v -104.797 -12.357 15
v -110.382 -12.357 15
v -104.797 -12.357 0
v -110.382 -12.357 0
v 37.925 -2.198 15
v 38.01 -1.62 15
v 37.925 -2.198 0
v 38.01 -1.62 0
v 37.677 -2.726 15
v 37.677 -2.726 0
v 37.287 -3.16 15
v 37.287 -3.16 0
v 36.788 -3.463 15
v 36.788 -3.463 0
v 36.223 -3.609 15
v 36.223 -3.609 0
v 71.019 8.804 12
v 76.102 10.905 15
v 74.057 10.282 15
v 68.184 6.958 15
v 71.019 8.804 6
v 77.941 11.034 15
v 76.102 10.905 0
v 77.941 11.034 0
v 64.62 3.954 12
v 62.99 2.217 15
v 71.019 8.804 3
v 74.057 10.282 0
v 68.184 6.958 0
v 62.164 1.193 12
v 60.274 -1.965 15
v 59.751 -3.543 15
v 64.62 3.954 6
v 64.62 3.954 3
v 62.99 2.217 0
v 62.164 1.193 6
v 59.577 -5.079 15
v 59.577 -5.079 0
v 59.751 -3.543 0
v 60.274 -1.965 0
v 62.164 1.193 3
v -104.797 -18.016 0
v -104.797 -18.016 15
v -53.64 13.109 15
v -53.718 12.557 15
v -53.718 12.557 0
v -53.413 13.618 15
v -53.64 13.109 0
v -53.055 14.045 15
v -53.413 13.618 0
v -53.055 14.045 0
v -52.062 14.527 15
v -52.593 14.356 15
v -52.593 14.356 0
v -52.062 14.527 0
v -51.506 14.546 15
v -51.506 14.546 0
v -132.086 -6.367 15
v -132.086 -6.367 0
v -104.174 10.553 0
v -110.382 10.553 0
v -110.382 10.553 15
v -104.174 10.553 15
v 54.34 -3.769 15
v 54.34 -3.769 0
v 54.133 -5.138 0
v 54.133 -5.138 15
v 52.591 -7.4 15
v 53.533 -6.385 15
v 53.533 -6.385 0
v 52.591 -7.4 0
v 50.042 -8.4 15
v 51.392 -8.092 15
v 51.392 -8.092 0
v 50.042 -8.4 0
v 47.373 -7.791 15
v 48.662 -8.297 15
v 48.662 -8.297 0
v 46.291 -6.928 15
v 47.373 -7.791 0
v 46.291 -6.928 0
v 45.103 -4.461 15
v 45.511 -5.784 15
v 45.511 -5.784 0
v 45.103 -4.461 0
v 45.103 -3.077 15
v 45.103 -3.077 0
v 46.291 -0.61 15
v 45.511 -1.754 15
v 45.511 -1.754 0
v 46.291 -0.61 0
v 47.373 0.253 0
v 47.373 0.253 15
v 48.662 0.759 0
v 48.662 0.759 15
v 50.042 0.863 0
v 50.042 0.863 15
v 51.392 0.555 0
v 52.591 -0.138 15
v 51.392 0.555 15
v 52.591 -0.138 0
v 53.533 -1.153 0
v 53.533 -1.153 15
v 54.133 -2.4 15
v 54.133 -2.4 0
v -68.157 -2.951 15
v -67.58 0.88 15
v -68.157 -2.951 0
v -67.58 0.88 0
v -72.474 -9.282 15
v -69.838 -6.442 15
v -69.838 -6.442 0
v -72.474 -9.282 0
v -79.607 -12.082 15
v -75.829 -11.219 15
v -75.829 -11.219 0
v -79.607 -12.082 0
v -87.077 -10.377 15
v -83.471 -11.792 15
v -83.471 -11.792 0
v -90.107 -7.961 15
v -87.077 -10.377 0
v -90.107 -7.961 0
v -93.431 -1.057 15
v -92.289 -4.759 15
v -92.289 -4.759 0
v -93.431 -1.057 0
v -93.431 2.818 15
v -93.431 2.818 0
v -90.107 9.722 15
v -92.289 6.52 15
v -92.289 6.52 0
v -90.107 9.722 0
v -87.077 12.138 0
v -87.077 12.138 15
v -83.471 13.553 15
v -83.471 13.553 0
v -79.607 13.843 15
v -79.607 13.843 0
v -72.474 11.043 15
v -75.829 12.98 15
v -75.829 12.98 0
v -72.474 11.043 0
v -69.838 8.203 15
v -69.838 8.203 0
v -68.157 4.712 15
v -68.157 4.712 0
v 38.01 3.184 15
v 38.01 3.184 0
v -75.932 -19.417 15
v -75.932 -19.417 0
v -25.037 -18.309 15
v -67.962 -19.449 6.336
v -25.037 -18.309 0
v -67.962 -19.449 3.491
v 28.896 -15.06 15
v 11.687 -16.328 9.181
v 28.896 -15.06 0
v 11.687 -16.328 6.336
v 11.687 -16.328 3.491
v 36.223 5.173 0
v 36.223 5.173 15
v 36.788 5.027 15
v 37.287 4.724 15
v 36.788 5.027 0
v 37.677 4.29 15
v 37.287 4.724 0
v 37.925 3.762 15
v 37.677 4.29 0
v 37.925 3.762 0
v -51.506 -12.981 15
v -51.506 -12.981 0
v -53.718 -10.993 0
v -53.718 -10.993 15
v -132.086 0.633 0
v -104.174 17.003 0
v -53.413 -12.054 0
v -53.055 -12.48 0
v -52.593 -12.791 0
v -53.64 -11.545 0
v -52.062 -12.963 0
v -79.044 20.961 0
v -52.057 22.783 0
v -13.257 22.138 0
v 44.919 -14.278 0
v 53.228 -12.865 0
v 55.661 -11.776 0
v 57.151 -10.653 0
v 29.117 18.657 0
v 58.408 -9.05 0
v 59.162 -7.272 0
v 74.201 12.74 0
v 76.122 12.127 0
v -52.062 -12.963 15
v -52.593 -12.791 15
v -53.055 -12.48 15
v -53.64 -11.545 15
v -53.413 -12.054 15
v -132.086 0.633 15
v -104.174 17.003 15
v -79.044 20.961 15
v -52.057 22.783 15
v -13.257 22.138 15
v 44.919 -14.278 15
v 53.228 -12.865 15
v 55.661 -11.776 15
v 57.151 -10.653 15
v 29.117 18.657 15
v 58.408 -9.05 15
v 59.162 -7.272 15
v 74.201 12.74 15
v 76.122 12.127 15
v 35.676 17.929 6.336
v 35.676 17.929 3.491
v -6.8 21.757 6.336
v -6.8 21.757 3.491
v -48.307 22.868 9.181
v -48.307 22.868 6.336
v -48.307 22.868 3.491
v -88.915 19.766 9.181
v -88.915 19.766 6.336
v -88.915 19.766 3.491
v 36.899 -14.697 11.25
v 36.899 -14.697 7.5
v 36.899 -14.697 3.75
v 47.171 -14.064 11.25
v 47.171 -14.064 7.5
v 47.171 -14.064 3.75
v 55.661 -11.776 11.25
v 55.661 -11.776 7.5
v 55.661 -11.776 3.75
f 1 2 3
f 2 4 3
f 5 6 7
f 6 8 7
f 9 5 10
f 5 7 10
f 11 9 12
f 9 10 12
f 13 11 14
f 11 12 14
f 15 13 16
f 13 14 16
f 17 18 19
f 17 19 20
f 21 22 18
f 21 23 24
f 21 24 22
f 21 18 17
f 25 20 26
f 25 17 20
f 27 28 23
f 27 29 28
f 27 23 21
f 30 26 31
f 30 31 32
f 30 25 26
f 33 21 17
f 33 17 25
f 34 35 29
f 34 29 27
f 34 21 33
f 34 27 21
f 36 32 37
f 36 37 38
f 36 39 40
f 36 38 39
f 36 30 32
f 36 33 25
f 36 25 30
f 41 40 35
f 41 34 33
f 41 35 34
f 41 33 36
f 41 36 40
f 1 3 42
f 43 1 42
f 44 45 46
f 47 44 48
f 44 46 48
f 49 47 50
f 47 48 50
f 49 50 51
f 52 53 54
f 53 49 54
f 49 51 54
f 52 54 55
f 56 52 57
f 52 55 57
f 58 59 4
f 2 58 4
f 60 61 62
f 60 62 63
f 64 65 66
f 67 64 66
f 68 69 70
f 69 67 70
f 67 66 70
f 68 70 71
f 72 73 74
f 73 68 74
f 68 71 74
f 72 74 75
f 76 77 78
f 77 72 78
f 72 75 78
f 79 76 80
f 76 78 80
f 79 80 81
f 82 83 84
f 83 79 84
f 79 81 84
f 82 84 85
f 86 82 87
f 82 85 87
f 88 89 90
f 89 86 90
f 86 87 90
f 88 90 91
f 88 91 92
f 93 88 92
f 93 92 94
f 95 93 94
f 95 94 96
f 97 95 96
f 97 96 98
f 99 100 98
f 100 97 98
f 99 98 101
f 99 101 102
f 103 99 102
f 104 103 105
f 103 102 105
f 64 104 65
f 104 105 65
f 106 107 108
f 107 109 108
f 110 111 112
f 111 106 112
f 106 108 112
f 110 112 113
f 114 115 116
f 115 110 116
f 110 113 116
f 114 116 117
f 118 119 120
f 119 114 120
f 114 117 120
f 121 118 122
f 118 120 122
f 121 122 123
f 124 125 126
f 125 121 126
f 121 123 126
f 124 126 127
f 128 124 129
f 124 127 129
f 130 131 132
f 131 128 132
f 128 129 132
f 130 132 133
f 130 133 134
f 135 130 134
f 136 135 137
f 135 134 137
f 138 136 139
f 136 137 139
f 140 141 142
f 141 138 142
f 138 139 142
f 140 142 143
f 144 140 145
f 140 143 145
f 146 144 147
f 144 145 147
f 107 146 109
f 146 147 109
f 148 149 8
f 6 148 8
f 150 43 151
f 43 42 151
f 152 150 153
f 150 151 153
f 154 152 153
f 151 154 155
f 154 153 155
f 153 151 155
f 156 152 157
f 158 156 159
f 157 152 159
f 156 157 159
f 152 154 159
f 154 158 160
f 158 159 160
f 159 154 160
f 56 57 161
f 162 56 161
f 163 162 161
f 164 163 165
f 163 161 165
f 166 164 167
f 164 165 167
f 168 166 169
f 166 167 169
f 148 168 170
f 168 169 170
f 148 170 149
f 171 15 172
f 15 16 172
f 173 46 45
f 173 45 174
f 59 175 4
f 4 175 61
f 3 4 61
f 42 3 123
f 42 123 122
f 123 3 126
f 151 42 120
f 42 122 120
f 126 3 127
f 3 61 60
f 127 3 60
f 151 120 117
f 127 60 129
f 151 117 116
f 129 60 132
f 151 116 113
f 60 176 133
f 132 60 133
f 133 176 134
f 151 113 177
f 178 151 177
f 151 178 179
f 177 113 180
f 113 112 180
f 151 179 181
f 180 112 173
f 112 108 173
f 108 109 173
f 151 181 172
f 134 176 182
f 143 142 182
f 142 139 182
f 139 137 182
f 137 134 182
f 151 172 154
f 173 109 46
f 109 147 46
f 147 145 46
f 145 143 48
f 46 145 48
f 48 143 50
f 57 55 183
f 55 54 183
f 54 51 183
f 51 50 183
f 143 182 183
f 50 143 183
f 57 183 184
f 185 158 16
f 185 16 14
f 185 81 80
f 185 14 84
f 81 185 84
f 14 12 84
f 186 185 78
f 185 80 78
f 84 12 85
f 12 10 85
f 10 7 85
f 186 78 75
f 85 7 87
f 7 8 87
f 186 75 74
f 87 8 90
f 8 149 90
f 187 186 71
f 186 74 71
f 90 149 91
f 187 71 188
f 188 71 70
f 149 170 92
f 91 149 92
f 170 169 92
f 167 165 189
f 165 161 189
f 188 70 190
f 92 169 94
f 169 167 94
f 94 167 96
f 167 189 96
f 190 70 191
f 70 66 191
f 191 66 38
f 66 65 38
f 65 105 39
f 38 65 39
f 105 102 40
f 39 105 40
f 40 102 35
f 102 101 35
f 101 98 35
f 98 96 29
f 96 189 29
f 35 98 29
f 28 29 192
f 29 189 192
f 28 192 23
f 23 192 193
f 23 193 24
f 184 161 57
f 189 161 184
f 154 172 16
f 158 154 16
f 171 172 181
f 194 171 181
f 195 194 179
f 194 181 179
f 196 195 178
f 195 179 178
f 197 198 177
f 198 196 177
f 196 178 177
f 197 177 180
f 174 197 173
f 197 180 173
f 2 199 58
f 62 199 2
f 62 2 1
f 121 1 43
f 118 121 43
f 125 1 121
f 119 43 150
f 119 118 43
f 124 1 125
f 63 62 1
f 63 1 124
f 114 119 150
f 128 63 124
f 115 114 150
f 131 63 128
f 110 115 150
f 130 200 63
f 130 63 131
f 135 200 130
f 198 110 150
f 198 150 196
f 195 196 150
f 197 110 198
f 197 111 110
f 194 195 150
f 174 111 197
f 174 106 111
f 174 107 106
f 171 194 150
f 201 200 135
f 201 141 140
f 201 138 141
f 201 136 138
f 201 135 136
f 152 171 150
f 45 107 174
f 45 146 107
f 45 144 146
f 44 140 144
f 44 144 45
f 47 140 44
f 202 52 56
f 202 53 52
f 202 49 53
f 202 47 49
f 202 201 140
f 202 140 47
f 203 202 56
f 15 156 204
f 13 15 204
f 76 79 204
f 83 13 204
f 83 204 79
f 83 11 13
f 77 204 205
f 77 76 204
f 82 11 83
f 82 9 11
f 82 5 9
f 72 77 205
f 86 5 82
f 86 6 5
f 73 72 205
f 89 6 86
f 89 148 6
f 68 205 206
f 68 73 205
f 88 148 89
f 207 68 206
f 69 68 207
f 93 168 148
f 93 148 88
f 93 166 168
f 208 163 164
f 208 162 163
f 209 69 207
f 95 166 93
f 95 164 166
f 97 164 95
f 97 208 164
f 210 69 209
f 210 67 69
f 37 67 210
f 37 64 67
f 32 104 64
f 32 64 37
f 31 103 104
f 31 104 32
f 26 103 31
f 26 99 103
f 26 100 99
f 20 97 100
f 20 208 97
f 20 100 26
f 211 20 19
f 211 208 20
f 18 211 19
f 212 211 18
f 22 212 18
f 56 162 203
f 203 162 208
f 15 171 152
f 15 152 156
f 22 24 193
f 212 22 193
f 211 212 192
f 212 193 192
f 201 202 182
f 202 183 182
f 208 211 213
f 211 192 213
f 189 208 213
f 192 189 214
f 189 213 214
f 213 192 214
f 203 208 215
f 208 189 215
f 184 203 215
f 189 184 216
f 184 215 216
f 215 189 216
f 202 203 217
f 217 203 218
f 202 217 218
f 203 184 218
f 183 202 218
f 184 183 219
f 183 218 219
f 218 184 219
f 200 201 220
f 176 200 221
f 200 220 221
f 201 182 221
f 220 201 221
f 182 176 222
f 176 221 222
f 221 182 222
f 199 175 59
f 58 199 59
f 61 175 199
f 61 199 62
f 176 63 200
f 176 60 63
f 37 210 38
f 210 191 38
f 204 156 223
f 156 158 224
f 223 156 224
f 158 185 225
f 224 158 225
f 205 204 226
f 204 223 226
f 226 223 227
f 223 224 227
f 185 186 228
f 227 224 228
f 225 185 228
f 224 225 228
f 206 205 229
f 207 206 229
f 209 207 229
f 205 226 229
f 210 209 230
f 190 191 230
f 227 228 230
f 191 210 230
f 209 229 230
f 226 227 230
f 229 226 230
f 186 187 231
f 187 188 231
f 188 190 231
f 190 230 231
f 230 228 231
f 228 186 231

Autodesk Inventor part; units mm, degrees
ref_plane "YZ Plane" through (0, 0, 0) normal (1, 0, 0) x (0, 1, 0)
ref_plane "XZ Plane" through (0, 0, 0) normal (0, 1, 0) x (-1, 0, 0)
ref_plane "XY Plane" through (0, 0, 0) normal (0, 0, 1) x (1, 0, 0)
sketch "Sketch3" plane through (0, 0, 0) normal (0, 0, 1) x (1, 0, 0)
  line L0 (-80.5781, 0.8805) -> (-80.5781, 20.7988) construction
  circle A0 centre (-80.5781, 0.8805) radius 12.9985
  line L1 (-53.718, 12.5571) -> (-53.718, -10.9927)
  arc A1 (-53.718, -10.9927) -> (-51.5055, -12.9814) centre (-51.718, -10.9927) ccw
  arc A2 (-51.5055, 14.5458) -> (-53.718, 12.5571) centre (-51.718, 12.5571) ccw
  line L2 (36.2228, -3.6088) -> (-51.5055, -12.9814)
  line L3 (38.0103, 3.1845) -> (38.0103, -1.6201)
  line L4 (-80.5781, 0.8805) -> (49.5525, 0.8805) construction
  circle A3 centre (49.6953, -3.7689) radius 4.6445
  line L5 (59.6953, 14.884) -> (59.6953, -12.7998) construction
  spline S0 degree 4 poles (77.9414, 11.0338) (75.5683, 12.9654) (71.7145, 13.0272) (66.8099, 13.9036) (60.7685, 14.7338) (56.2959, 15.3578) (51.7728, 15.9509) (47.2242, 16.5426) (42.6244, 17.1111) (37.9974, 17.6651) (33.3378, 18.1987) (28.6546, 18.7114) (23.9504, 19.2026) (19.2309, 19.6699) (14.5002, 20.1135) (9.7632, 20.5291) (5.025, 20.9191) (0.2903, 21.2792) (-4.4372, 21.6095) (-9.151, 21.9092) (-13.8524, 22.1766) (-18.5268, 22.4102) (-23.2002, 22.6105) (-27.8558, 22.7627) (-32.4748, 22.8704) (-37.0553, 22.9312) (-41.5904, 22.9454) (-46.0738, 22.9127) (-50.5027, 22.8323) (-54.8678, 22.7052) (-59.1755, 22.5324) (-63.394, 22.3084) (-67.5752, 22.0492) (-71.5451, 21.7209) (-75.7777, 21.4072) (-79.04, 20.9063) (-83.4863, 20.5541) (-87.0067, 20.037) (-90.7113, 19.5168) (-94.2172, 18.9459) (-97.6363, 18.3426) (-100.9342, 17.7015) (-104.1216, 17.0263) (-107.1909, 16.3187) (-110.1396, 15.5797) (-112.9656, 14.8117) (-115.6652, 14.0172) (-118.2357, 13.1965) (-120.6759, 12.3541) (-122.9817, 11.4895) (-125.1529, 10.6071) (-127.1857, 9.7065) (-129.0794, 8.7914) (-130.8324, 7.8633) (-132.4429, 6.923) (-133.9096, 5.9737) (-135.2322, 5.016) (-136.4083, 4.0508) (-137.4392, 3.0816) (-138.3215, 2.1025) (-139.0592, 1.1321) (-139.6407, 0.1249) (-140.106, -0.8362) (-140.3589, -2.0477) (-140.602, -2.598) (-140.1166, -5.4607) (-140.0539, -5.4622) (-139.4639, -6.7645) (-138.8842, -7.4979) (-138.1173, -8.3934) (-137.2199, -9.1877) (-136.1721, -9.9852) (-134.9893, -10.738) (-133.6669, -11.4655) (-132.2091, -12.1599) (-130.6156, -12.8245) (-128.8897, -13.4579) (-127.0312, -14.0591) (-125.0439, -14.6296) (-122.9287, -15.1678) (-120.6879, -15.6738) (-118.3241, -16.1476) (-115.8396, -16.5892) (-113.2366, -16.9984) (-110.5176, -17.3742) (-107.6861, -17.7183) (-104.7439, -18.0297) (-101.6943, -18.3095) (-98.5398, -18.5568) (-95.2843, -18.7732) (-91.9297, -18.9579) (-88.48, -19.1131) (-84.9381, -19.2376) (-81.3071, -19.3341) (-77.5906, -19.4015) (-73.7915, -19.4421) (-69.9139, -19.4561) (-65.961, -19.445) (-61.9362, -19.4102) (-57.8434, -19.3518) (-53.6861, -19.2727) (-49.4679, -19.1731) (-45.1932, -19.0538) (-40.8649, -18.9183) (-36.4879, -18.766) (-32.0649, -18.5992) (-27.598, -18.4192) (-23.0941, -18.227) (-18.5434, -18.0273) (-13.9382, -17.8076) (-9.3141, -17.5719) (-4.666, -17.3195) (-0.0002, -17.052) (4.6675, -16.7728) (9.3655, -16.4759) (14.0236, -16.1832) (19.545, -15.7815) (23.3079, -15.6072) (27.1098, -15.1781) (28.8959, -15.0599) knots 0 0 0 0 0 0.024672 0.034555 0.0445 0.054495 0.064543 0.074632 0.084755 0.094911 0.105094 0.115299 0.125521 0.135755 0.145995 0.156237 0.166475 0.176705 0.186921 0.197118 0.207299 0.217463 0.227605 0.23772 0.247796 0.257824 0.267798 0.277713 0.287563 0.297345 0.307053 0.31668 0.326224 0.335555 0.344908 0.354162 0.363308 0.372467 0.381393 0.390196 0.398872 0.407415 0.41582 0.424082 0.432193 0.44015 0.447945 0.455574 0.46303 0.470307 0.477401 0.484305 0.491015 0.497525 0.503831 0.509931 0.515822 0.521506 0.526986 0.53227 0.537373 0.542316 0.547131 0.552525 0.557529 0.562533 0.567581 0.57205 0.576988 0.582082 0.587354 0.592817 0.598478 0.604341 0.610406 0.616671 0.623133 0.629789 0.636632 0.643658 0.650861 0.658236 0.665777 0.673478 0.681333 0.689338 0.697486 0.705771 0.71419 0.722736 0.731403 0.740188 0.749084 0.758087 0.767192 0.776393 0.785687 0.795067 0.804529 0.814069 0.823682 0.833362 0.843106 0.852907 0.862763 0.872667 0.88262 0.892624 0.902675 0.912766 0.92289 0.933033 0.943191 0.953358 0.963531 0.973703 0.984092 1 1 1 1 1
  line L6 (7.5013, -16.4763) -> (50.2906, -13.6435) construction
  arc A4 (44.8353, -17.2546) -> (13.385, -19.3367) centre (31.5327, -54.8885) ccw construction
  line L7 (159.6953, -3.8066) -> (59.6953, -3.8066) construction
  line L8 (-51.5055, 14.5458) -> (36.2228, 5.1732)
  arc A5 (36.2228, -3.6088) -> (38.0103, -1.6201) centre (36.0103, -1.6201) ccw
  arc A6 (38.0103, 3.1845) -> (36.2228, 5.1732) centre (36.0103, 3.1845) ccw
  spline S1 degree 4 poles (78.1029, 11.0141) (76.6463, 11.2227) (73.9909, 10.5042) (70.2765, 8.6041) (66.0429, 5.3938) (62.3889, 1.8499) (60.314, -1.2467) (59.5572, -3.5763) (59.5773, -5.0793) knots 0 0 0 0 0 0.302475 0.43895 0.576633 0.708802 1 1 1 1 1
  spline S2 degree 4 poles (28.8959, -15.0599) (34.0984, -14.7105) (49.269, -14.182) (58.5645, -15.239) (59.5773, -5.0793) knots 0 0 0 0 0 1 1 1 1 1
  line L9 (28.8959, -15.0599) -> (34.0984, -14.7105) construction
  line L10 (34.0984, -14.7105) -> (49.269, -14.182) construction
  line L11 (49.269, -14.182) -> (58.5645, -15.239) construction
  line L12 (58.5645, -15.239) -> (59.5773, -5.0793) construction
  line L13 (-140.4646, -2.8394) -> (159.4818, -3.8173) construction
  line L14 (-132.0856, 0.6333) -> (-132.0856, -6.3667)
  line L15 (-132.0856, -6.3667) -> (-110.3816, -12.3574)
  line L16 (-110.3816, -12.3574) -> (-104.797, -12.3574)
  line L17 (-104.797, -12.3574) -> (-104.797, -18.0156)
  line L18 (-132.0856, 0.6333) -> (-110.3816, 10.553)
  line L19 (-110.3816, 10.553) -> (-104.1736, 10.553)
  line L20 (-104.1736, 10.553) -> (-104.1736, 17.0026)
  point P0 (0, 0)
  point P1 (17.6589, 23.5628)
  point P2 (75.883, 10.8572)
  point P3 (72.8647, 9.7686)
  point P4 (69.4179, 7.8149)
  point P5 (66.0452, 5.2617)
  point P6 (63.1887, 2.4463)
  point P7 (61.1228, -0.3317)
  point P8 (59.9357, -2.8689)
  point P9 (-160.0931, -3.8671)
  point P10 (28.8959, -15.0599)
  point P11 (69.5533, 13.4647)
  point P12 (65.1899, 14.1023)
  point P13 (60.7936, 14.7318)
  point P14 (56.3207, 15.3468)
  point P15 (51.7945, 15.947)
  point P16 (47.2398, 16.5346)
  point P17 (42.6414, 17.1053)
  point P18 (38.0104, 17.6585)
  point P19 (33.3491, 18.1925)
  point P20 (28.6632, 18.7055)
  point P21 (23.9568, 19.1966)
  point P22 (19.2348, 19.6643)
  point P23 (14.5017, 20.1074)
  point P24 (9.7623, 20.5238)
  point P25 (5.0217, 20.9132)
  point P26 (0.2844, 21.2735)
  point P27 (-4.4451, 21.6038)
  point P28 (-9.1614, 21.9032)
  point P29 (-13.86, 22.1702)
  point P30 (-18.5361, 22.4036)
  point P31 (-23.211, 22.601)
  point P32 (-27.8721, 22.754)
  point P33 (-32.4966, 22.8611)
  point P34 (-37.0797, 22.9217)
  point P35 (-41.6169, 22.9356)
  point P36 (-46.1028, 22.9023)
  point P37 (-50.5329, 22.8216)
  point P38 (-54.9021, 22.6941)
  point P39 (-59.2065, 22.5195)
  point P40 (-63.4406, 22.2977)
  point P41 (-67.6008, 22.0302)
  point P42 (-71.6806, 21.7165)
  point P43 (-75.6814, 21.3591)
  point P44 (-79.1834, 20.9458)
  point P45 (-83.4048, 20.5095)
  point P46 (-87.1309, 20.023)
  point P47 (-90.7527, 19.494)
  point P48 (-94.2725, 18.9266)
  point P49 (-97.6845, 18.3211)
  point P50 (-100.9861, 17.6791)
  point P51 (-107.2438, 16.2934)
  point P52 (-110.1931, 15.553)
  point P53 (-113.0194, 14.7835)
  point P54 (-115.7191, 13.987)
  point P55 (-118.2898, 13.165)
  point P56 (-120.7294, 12.3201)
  point P57 (-123.0349, 11.454)
  point P58 (-125.2048, 10.569)
  point P59 (-127.2364, 9.6666)
  point P60 (-129.1282, 8.7491)
  point P61 (-130.8786, 7.8185)
  point P62 (-132.486, 6.8762)
  point P63 (-133.9488, 5.9245)
  point P64 (-135.2661, 4.9648)
  point P65 (-136.4363, 3.9987)
  point P66 (-137.4592, 3.0275)
  point P67 (-138.3336, 2.0531)
  point P68 (-139.0591, 1.0763)
  point P69 (-139.6352, 0.0983)
  point P70 (-140.0613, -0.8802)
  point P71 (-140.338, -1.8576)
  point P72 (-140.1239, -5.2398)
  point P73 (-139.9547, -5.7022)
  point P74 (-139.492, -6.6066)
  point P75 (-138.8844, -7.4823)
  point P76 (-138.1328, -8.3292)
  point P77 (-137.2384, -9.147)
  point P78 (-136.202, -9.9355)
  point P79 (-135.0249, -10.6943)
  point P80 (-133.7085, -11.4228)
  point P81 (-132.2548, -12.1206)
  point P82 (-130.6648, -12.7879)
  point P83 (-128.941, -13.4239)
  point P84 (-127.0846, -14.0282)
  point P85 (-125.0983, -14.6009)
  point P86 (-122.9839, -15.1415)
  point P87 (-120.7435, -15.6497)
  point P88 (-118.3798, -16.1256)
  point P89 (-115.8952, -16.569)
  point P90 (-113.2918, -16.9797)
  point P91 (-110.5723, -17.3574)
  point P92 (-107.74, -17.7027)
  point P93 (-101.7463, -18.2964)
  point P94 (-98.5909, -18.5451)
  point P95 (-95.3341, -18.7623)
  point P96 (-91.9783, -18.9484)
  point P97 (-88.5271, -19.1041)
  point P98 (-84.9838, -19.2298)
  point P99 (-81.3514, -19.3267)
  point P100 (-77.6332, -19.3951)
  point P101 (-73.8324, -19.4362)
  point P102 (-69.9531, -19.4509)
  point P103 (-65.9985, -19.4404)
  point P104 (-61.9719, -19.4059)
  point P105 (-57.8772, -19.3483)
  point P106 (-53.718, -19.2694)
  point P107 (-49.4979, -19.1701)
  point P108 (-45.2211, -19.0516)
  point P109 (-40.8909, -18.916)
  point P110 (-36.5118, -18.7642)
  point P111 (-32.0871, -18.5977)
  point P112 (-27.6213, -18.418)
  point P113 (-23.1183, -18.2269)
  point P114 (-18.5646, -18.0247)
  point P115 (-13.9566, -17.8054)
  point P116 (-9.3252, -17.5693)
  point P117 (-4.674, -17.317)
  point P118 (-0.0078, -17.05)
  point P119 (4.6686, -16.7695)
  point P120 (9.3513, -16.477)
  point P121 (14.0352, -16.1731)
  point P122 (18.7161, -15.8596)
  point P123 (23.3889, -15.5371)
  point P124 (78.0825, 12.164)
  point P125 (159.2574, -3.8401)
  point P126 (158.8836, -3.8779)
  point P127 (158.3607, -3.9307)
  point P128 (157.6896, -3.9985)
  point P129 (156.8706, -4.081)
  point P130 (155.9046, -4.1779)
  point P131 (154.7931, -4.2892)
  point P132 (153.5367, -4.4143)
  point P133 (152.1372, -4.5532)
  point P134 (150.5955, -4.7056)
  point P135 (148.914, -4.8712)
  point P136 (147.0936, -5.0494)
  point P137 (145.137, -5.2399)
  point P138 (143.0457, -5.4421)
  point P139 (140.8221, -5.6563)
  point P140 (138.4686, -5.8813)
  point P141 (135.9876, -6.1174)
  point P142 (133.3815, -6.3634)
  point P143 (130.6533, -6.6196)
  point P144 (127.8054, -6.8851)
  point P145 (124.8414, -7.1596)
  point P146 (121.7634, -7.4428)
  point P147 (118.5756, -7.7341)
  point P148 (115.2804, -8.0332)
  point P149 (111.8817, -8.3395)
  point P150 (108.3828, -8.6527)
  point P151 (104.787, -8.9722)
  point P152 (101.0985, -9.2974)
  point P153 (97.3206, -9.6283)
  point P154 (93.4572, -9.9643)
  point P155 (89.5122, -10.3048)
  point P156 (85.4898, -10.6492)
  point P157 (81.3936, -10.9969)
  point P158 (77.2284, -11.3479)
  point P159 (72.9975, -11.701)
  point P160 (68.7057, -12.0556)
  point P161 (64.3572, -12.4117)
  point P162 (59.9559, -12.7678)
  point P163 (55.5069, -13.1239)
  point P164 (51.0138, -13.4788)
  point P165 (46.4817, -13.8316)
  point P166 (41.9148, -14.182)
  point P167 (35.7035, -14.3277)
  point P168 (32.6946, -14.8708)
  point P169 (82.2459, 11.5043)
  point P170 (86.3364, 10.8401)
  point P171 (90.3495, 10.1732)
  point P172 (94.2816, 9.5051)
  point P173 (98.1288, 8.837)
  point P174 (101.8872, 8.171)
  point P175 (105.5538, 7.5086)
  point P176 (109.1244, 6.8507)
  point P177 (112.596, 6.1997)
  point P178 (115.9653, 5.5565)
  point P179 (119.2287, 4.9229)
  point P180 (122.3835, 4.3007)
  point P181 (125.4264, 3.6911)
  point P182 (128.3547, 3.0956)
  point P183 (131.1654, 2.5157)
  point P184 (133.8561, 1.9532)
  point P185 (136.4244, 1.4093)
  point P186 (138.8676, 0.8855)
  point P187 (141.1833, 0.383)
  point P188 (143.3697, -0.0964)
  point P189 (145.4247, -0.5518)
  point P190 (147.3462, -0.9817)
  point P191 (149.1327, -1.3852)
  point P192 (150.7821, -1.7608)
  point P193 (152.2935, -2.1073)
  point P194 (153.6651, -2.4241)
  point P195 (154.8954, -2.7103)
  point P196 (155.9838, -2.9647)
  point P197 (156.9291, -3.187)
  point P198 (157.7307, -3.376)
  point P199 (158.3871, -3.5317)
  dimension "d3" = 25.997
  dimension "d6" = 9.289
  dimension "d7" = 110
  dimension "d8" = 100
  dimension "d9" = 2
  dimension "d11" = 4.6493
  dimension "d25" = 7
  dimension "d26" = 3.5
  dimension "d27" = 8.379
  dimension "d28" = 30.083
  dimension "d29" = 5
  dimension "d30" = 5
  dimension "d32" = 59.8865
extrude "Extrusion2" add sketch "Sketch3" along normal blind 15 contours S1 S2 S0 L17 L16 L15 L14 L18 L19 L20
properties part number "4P.01.01.11-TW-v1-WingRibWFlapSingle" material "Polyurethane Foam"
